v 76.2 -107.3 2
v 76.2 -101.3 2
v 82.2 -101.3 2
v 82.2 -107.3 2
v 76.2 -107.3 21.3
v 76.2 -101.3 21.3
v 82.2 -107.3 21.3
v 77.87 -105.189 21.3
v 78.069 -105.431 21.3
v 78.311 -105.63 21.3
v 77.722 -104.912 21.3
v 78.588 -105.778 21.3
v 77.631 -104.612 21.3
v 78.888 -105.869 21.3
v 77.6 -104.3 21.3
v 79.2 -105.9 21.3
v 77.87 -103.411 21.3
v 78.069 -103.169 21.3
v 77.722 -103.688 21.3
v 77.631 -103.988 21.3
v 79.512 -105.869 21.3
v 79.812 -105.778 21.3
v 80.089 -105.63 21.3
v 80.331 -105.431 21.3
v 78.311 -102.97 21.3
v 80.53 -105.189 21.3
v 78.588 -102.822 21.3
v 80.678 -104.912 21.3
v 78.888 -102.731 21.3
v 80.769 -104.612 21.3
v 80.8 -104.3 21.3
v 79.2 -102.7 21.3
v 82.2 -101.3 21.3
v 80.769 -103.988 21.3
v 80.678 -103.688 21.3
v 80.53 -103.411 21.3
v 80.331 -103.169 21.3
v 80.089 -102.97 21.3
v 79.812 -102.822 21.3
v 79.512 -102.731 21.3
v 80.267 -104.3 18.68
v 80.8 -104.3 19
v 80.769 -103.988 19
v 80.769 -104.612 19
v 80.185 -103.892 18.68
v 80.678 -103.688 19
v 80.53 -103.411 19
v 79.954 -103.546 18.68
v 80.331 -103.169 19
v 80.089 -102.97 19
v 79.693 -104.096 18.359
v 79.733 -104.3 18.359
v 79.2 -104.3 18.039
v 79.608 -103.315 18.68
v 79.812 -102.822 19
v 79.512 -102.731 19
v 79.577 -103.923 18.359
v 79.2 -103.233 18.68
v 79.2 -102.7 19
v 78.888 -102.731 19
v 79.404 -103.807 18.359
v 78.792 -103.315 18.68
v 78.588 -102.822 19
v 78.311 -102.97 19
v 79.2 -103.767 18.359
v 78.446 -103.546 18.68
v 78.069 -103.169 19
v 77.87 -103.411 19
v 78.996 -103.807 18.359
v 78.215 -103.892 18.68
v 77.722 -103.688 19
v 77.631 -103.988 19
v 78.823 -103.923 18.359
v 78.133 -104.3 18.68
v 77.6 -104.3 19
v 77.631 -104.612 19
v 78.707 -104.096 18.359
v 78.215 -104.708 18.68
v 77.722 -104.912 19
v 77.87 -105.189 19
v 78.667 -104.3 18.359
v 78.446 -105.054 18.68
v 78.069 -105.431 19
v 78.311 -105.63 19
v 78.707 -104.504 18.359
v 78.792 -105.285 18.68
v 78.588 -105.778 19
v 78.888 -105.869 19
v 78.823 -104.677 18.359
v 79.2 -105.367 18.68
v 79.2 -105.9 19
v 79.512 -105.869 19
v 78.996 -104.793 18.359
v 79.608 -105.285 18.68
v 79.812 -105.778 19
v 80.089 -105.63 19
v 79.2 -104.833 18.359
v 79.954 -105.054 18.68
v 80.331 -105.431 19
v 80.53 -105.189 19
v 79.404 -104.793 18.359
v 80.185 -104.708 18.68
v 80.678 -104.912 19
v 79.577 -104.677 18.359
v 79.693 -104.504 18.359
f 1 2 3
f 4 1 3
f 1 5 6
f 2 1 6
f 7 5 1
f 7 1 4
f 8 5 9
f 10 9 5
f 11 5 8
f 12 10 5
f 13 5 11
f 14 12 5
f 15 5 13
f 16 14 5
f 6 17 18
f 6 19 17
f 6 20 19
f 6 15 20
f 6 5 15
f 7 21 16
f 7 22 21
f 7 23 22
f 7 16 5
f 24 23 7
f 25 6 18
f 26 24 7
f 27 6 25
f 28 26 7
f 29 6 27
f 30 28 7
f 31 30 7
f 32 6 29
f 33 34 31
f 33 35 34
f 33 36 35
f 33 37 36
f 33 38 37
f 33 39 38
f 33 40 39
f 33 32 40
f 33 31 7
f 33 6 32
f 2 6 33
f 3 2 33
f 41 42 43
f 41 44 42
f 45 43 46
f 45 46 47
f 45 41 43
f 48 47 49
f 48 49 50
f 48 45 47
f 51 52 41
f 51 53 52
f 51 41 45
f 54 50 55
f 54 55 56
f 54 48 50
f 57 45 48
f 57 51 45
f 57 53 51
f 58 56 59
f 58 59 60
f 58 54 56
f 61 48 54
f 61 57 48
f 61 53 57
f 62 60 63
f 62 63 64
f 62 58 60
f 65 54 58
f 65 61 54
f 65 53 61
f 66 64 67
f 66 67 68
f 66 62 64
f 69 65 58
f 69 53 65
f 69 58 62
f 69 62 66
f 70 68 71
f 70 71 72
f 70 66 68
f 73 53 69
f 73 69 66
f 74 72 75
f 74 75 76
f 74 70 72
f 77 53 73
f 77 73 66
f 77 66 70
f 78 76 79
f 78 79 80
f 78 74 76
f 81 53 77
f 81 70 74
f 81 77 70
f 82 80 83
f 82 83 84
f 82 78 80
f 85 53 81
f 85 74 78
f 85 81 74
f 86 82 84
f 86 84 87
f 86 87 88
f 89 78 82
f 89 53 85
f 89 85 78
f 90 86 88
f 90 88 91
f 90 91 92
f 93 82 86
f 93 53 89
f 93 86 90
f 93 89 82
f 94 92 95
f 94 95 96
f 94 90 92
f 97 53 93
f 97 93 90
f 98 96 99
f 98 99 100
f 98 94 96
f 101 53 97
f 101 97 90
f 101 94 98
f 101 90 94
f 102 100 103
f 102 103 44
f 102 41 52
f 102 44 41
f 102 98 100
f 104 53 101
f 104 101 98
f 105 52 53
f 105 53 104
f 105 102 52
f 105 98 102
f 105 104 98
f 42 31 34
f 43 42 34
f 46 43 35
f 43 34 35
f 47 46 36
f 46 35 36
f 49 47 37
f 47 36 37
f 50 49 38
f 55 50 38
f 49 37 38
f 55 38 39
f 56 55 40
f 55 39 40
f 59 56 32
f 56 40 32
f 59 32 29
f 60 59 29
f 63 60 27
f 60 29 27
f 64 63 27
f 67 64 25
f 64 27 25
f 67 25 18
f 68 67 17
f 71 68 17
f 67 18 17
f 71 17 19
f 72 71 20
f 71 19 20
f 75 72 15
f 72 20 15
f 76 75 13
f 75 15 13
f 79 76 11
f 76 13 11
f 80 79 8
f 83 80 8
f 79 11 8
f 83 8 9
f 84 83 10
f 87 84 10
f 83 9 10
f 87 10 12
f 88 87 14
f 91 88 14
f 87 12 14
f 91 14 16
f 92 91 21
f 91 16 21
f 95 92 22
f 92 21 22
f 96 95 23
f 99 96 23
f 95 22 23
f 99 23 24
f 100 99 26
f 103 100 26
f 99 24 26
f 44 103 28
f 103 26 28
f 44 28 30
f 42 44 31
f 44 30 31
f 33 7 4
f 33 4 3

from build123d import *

# Parameters (mm, degrees)
SKETCH025_W      = 6
SKETCH025_H      = 6
EXTRUDE016_DEPTH = 19.3
SKETCH026_R      = 1.6
HOLE003_DEPTH    = 2.3
HOLE003_TIPS_R   = 1.6


with BuildPart() as part:
    # Sketch025 (on Face6 of BaseFeature005) → Extrude016 (new body)
    with BuildSketch(Plane.XY.offset(2)):
        with Locations((79.200001, -104.300002)):
            Rectangle(SKETCH025_W, SKETCH025_H)
    extrude(amount=EXTRUDE016_DEPTH)

    # Sketch026 (on Face6 of Extrude016) → Hole003 (cut)
    with BuildSketch(Plane.XY.offset(21.3)):
        with Locations((79.200001, -104.300002)):
            Circle(SKETCH026_R)
    extrude(amount=-HOLE003_DEPTH, mode=Mode.SUBTRACT)

    # Hole003 tips → Hole003 tip 1 section 0
    with BuildSketch(Plane.XY.offset(19), mode=Mode.PRIVATE) as hole003_tip_1_s0:
        with Locations((79.200001, -104.300002)):
            Circle(HOLE003_TIPS_R)
    loft([hole003_tip_1_s0.sketch, Vertex(79.200001, -104.300002, 18.038623)], mode=Mode.SUBTRACT)


solid = part.part
